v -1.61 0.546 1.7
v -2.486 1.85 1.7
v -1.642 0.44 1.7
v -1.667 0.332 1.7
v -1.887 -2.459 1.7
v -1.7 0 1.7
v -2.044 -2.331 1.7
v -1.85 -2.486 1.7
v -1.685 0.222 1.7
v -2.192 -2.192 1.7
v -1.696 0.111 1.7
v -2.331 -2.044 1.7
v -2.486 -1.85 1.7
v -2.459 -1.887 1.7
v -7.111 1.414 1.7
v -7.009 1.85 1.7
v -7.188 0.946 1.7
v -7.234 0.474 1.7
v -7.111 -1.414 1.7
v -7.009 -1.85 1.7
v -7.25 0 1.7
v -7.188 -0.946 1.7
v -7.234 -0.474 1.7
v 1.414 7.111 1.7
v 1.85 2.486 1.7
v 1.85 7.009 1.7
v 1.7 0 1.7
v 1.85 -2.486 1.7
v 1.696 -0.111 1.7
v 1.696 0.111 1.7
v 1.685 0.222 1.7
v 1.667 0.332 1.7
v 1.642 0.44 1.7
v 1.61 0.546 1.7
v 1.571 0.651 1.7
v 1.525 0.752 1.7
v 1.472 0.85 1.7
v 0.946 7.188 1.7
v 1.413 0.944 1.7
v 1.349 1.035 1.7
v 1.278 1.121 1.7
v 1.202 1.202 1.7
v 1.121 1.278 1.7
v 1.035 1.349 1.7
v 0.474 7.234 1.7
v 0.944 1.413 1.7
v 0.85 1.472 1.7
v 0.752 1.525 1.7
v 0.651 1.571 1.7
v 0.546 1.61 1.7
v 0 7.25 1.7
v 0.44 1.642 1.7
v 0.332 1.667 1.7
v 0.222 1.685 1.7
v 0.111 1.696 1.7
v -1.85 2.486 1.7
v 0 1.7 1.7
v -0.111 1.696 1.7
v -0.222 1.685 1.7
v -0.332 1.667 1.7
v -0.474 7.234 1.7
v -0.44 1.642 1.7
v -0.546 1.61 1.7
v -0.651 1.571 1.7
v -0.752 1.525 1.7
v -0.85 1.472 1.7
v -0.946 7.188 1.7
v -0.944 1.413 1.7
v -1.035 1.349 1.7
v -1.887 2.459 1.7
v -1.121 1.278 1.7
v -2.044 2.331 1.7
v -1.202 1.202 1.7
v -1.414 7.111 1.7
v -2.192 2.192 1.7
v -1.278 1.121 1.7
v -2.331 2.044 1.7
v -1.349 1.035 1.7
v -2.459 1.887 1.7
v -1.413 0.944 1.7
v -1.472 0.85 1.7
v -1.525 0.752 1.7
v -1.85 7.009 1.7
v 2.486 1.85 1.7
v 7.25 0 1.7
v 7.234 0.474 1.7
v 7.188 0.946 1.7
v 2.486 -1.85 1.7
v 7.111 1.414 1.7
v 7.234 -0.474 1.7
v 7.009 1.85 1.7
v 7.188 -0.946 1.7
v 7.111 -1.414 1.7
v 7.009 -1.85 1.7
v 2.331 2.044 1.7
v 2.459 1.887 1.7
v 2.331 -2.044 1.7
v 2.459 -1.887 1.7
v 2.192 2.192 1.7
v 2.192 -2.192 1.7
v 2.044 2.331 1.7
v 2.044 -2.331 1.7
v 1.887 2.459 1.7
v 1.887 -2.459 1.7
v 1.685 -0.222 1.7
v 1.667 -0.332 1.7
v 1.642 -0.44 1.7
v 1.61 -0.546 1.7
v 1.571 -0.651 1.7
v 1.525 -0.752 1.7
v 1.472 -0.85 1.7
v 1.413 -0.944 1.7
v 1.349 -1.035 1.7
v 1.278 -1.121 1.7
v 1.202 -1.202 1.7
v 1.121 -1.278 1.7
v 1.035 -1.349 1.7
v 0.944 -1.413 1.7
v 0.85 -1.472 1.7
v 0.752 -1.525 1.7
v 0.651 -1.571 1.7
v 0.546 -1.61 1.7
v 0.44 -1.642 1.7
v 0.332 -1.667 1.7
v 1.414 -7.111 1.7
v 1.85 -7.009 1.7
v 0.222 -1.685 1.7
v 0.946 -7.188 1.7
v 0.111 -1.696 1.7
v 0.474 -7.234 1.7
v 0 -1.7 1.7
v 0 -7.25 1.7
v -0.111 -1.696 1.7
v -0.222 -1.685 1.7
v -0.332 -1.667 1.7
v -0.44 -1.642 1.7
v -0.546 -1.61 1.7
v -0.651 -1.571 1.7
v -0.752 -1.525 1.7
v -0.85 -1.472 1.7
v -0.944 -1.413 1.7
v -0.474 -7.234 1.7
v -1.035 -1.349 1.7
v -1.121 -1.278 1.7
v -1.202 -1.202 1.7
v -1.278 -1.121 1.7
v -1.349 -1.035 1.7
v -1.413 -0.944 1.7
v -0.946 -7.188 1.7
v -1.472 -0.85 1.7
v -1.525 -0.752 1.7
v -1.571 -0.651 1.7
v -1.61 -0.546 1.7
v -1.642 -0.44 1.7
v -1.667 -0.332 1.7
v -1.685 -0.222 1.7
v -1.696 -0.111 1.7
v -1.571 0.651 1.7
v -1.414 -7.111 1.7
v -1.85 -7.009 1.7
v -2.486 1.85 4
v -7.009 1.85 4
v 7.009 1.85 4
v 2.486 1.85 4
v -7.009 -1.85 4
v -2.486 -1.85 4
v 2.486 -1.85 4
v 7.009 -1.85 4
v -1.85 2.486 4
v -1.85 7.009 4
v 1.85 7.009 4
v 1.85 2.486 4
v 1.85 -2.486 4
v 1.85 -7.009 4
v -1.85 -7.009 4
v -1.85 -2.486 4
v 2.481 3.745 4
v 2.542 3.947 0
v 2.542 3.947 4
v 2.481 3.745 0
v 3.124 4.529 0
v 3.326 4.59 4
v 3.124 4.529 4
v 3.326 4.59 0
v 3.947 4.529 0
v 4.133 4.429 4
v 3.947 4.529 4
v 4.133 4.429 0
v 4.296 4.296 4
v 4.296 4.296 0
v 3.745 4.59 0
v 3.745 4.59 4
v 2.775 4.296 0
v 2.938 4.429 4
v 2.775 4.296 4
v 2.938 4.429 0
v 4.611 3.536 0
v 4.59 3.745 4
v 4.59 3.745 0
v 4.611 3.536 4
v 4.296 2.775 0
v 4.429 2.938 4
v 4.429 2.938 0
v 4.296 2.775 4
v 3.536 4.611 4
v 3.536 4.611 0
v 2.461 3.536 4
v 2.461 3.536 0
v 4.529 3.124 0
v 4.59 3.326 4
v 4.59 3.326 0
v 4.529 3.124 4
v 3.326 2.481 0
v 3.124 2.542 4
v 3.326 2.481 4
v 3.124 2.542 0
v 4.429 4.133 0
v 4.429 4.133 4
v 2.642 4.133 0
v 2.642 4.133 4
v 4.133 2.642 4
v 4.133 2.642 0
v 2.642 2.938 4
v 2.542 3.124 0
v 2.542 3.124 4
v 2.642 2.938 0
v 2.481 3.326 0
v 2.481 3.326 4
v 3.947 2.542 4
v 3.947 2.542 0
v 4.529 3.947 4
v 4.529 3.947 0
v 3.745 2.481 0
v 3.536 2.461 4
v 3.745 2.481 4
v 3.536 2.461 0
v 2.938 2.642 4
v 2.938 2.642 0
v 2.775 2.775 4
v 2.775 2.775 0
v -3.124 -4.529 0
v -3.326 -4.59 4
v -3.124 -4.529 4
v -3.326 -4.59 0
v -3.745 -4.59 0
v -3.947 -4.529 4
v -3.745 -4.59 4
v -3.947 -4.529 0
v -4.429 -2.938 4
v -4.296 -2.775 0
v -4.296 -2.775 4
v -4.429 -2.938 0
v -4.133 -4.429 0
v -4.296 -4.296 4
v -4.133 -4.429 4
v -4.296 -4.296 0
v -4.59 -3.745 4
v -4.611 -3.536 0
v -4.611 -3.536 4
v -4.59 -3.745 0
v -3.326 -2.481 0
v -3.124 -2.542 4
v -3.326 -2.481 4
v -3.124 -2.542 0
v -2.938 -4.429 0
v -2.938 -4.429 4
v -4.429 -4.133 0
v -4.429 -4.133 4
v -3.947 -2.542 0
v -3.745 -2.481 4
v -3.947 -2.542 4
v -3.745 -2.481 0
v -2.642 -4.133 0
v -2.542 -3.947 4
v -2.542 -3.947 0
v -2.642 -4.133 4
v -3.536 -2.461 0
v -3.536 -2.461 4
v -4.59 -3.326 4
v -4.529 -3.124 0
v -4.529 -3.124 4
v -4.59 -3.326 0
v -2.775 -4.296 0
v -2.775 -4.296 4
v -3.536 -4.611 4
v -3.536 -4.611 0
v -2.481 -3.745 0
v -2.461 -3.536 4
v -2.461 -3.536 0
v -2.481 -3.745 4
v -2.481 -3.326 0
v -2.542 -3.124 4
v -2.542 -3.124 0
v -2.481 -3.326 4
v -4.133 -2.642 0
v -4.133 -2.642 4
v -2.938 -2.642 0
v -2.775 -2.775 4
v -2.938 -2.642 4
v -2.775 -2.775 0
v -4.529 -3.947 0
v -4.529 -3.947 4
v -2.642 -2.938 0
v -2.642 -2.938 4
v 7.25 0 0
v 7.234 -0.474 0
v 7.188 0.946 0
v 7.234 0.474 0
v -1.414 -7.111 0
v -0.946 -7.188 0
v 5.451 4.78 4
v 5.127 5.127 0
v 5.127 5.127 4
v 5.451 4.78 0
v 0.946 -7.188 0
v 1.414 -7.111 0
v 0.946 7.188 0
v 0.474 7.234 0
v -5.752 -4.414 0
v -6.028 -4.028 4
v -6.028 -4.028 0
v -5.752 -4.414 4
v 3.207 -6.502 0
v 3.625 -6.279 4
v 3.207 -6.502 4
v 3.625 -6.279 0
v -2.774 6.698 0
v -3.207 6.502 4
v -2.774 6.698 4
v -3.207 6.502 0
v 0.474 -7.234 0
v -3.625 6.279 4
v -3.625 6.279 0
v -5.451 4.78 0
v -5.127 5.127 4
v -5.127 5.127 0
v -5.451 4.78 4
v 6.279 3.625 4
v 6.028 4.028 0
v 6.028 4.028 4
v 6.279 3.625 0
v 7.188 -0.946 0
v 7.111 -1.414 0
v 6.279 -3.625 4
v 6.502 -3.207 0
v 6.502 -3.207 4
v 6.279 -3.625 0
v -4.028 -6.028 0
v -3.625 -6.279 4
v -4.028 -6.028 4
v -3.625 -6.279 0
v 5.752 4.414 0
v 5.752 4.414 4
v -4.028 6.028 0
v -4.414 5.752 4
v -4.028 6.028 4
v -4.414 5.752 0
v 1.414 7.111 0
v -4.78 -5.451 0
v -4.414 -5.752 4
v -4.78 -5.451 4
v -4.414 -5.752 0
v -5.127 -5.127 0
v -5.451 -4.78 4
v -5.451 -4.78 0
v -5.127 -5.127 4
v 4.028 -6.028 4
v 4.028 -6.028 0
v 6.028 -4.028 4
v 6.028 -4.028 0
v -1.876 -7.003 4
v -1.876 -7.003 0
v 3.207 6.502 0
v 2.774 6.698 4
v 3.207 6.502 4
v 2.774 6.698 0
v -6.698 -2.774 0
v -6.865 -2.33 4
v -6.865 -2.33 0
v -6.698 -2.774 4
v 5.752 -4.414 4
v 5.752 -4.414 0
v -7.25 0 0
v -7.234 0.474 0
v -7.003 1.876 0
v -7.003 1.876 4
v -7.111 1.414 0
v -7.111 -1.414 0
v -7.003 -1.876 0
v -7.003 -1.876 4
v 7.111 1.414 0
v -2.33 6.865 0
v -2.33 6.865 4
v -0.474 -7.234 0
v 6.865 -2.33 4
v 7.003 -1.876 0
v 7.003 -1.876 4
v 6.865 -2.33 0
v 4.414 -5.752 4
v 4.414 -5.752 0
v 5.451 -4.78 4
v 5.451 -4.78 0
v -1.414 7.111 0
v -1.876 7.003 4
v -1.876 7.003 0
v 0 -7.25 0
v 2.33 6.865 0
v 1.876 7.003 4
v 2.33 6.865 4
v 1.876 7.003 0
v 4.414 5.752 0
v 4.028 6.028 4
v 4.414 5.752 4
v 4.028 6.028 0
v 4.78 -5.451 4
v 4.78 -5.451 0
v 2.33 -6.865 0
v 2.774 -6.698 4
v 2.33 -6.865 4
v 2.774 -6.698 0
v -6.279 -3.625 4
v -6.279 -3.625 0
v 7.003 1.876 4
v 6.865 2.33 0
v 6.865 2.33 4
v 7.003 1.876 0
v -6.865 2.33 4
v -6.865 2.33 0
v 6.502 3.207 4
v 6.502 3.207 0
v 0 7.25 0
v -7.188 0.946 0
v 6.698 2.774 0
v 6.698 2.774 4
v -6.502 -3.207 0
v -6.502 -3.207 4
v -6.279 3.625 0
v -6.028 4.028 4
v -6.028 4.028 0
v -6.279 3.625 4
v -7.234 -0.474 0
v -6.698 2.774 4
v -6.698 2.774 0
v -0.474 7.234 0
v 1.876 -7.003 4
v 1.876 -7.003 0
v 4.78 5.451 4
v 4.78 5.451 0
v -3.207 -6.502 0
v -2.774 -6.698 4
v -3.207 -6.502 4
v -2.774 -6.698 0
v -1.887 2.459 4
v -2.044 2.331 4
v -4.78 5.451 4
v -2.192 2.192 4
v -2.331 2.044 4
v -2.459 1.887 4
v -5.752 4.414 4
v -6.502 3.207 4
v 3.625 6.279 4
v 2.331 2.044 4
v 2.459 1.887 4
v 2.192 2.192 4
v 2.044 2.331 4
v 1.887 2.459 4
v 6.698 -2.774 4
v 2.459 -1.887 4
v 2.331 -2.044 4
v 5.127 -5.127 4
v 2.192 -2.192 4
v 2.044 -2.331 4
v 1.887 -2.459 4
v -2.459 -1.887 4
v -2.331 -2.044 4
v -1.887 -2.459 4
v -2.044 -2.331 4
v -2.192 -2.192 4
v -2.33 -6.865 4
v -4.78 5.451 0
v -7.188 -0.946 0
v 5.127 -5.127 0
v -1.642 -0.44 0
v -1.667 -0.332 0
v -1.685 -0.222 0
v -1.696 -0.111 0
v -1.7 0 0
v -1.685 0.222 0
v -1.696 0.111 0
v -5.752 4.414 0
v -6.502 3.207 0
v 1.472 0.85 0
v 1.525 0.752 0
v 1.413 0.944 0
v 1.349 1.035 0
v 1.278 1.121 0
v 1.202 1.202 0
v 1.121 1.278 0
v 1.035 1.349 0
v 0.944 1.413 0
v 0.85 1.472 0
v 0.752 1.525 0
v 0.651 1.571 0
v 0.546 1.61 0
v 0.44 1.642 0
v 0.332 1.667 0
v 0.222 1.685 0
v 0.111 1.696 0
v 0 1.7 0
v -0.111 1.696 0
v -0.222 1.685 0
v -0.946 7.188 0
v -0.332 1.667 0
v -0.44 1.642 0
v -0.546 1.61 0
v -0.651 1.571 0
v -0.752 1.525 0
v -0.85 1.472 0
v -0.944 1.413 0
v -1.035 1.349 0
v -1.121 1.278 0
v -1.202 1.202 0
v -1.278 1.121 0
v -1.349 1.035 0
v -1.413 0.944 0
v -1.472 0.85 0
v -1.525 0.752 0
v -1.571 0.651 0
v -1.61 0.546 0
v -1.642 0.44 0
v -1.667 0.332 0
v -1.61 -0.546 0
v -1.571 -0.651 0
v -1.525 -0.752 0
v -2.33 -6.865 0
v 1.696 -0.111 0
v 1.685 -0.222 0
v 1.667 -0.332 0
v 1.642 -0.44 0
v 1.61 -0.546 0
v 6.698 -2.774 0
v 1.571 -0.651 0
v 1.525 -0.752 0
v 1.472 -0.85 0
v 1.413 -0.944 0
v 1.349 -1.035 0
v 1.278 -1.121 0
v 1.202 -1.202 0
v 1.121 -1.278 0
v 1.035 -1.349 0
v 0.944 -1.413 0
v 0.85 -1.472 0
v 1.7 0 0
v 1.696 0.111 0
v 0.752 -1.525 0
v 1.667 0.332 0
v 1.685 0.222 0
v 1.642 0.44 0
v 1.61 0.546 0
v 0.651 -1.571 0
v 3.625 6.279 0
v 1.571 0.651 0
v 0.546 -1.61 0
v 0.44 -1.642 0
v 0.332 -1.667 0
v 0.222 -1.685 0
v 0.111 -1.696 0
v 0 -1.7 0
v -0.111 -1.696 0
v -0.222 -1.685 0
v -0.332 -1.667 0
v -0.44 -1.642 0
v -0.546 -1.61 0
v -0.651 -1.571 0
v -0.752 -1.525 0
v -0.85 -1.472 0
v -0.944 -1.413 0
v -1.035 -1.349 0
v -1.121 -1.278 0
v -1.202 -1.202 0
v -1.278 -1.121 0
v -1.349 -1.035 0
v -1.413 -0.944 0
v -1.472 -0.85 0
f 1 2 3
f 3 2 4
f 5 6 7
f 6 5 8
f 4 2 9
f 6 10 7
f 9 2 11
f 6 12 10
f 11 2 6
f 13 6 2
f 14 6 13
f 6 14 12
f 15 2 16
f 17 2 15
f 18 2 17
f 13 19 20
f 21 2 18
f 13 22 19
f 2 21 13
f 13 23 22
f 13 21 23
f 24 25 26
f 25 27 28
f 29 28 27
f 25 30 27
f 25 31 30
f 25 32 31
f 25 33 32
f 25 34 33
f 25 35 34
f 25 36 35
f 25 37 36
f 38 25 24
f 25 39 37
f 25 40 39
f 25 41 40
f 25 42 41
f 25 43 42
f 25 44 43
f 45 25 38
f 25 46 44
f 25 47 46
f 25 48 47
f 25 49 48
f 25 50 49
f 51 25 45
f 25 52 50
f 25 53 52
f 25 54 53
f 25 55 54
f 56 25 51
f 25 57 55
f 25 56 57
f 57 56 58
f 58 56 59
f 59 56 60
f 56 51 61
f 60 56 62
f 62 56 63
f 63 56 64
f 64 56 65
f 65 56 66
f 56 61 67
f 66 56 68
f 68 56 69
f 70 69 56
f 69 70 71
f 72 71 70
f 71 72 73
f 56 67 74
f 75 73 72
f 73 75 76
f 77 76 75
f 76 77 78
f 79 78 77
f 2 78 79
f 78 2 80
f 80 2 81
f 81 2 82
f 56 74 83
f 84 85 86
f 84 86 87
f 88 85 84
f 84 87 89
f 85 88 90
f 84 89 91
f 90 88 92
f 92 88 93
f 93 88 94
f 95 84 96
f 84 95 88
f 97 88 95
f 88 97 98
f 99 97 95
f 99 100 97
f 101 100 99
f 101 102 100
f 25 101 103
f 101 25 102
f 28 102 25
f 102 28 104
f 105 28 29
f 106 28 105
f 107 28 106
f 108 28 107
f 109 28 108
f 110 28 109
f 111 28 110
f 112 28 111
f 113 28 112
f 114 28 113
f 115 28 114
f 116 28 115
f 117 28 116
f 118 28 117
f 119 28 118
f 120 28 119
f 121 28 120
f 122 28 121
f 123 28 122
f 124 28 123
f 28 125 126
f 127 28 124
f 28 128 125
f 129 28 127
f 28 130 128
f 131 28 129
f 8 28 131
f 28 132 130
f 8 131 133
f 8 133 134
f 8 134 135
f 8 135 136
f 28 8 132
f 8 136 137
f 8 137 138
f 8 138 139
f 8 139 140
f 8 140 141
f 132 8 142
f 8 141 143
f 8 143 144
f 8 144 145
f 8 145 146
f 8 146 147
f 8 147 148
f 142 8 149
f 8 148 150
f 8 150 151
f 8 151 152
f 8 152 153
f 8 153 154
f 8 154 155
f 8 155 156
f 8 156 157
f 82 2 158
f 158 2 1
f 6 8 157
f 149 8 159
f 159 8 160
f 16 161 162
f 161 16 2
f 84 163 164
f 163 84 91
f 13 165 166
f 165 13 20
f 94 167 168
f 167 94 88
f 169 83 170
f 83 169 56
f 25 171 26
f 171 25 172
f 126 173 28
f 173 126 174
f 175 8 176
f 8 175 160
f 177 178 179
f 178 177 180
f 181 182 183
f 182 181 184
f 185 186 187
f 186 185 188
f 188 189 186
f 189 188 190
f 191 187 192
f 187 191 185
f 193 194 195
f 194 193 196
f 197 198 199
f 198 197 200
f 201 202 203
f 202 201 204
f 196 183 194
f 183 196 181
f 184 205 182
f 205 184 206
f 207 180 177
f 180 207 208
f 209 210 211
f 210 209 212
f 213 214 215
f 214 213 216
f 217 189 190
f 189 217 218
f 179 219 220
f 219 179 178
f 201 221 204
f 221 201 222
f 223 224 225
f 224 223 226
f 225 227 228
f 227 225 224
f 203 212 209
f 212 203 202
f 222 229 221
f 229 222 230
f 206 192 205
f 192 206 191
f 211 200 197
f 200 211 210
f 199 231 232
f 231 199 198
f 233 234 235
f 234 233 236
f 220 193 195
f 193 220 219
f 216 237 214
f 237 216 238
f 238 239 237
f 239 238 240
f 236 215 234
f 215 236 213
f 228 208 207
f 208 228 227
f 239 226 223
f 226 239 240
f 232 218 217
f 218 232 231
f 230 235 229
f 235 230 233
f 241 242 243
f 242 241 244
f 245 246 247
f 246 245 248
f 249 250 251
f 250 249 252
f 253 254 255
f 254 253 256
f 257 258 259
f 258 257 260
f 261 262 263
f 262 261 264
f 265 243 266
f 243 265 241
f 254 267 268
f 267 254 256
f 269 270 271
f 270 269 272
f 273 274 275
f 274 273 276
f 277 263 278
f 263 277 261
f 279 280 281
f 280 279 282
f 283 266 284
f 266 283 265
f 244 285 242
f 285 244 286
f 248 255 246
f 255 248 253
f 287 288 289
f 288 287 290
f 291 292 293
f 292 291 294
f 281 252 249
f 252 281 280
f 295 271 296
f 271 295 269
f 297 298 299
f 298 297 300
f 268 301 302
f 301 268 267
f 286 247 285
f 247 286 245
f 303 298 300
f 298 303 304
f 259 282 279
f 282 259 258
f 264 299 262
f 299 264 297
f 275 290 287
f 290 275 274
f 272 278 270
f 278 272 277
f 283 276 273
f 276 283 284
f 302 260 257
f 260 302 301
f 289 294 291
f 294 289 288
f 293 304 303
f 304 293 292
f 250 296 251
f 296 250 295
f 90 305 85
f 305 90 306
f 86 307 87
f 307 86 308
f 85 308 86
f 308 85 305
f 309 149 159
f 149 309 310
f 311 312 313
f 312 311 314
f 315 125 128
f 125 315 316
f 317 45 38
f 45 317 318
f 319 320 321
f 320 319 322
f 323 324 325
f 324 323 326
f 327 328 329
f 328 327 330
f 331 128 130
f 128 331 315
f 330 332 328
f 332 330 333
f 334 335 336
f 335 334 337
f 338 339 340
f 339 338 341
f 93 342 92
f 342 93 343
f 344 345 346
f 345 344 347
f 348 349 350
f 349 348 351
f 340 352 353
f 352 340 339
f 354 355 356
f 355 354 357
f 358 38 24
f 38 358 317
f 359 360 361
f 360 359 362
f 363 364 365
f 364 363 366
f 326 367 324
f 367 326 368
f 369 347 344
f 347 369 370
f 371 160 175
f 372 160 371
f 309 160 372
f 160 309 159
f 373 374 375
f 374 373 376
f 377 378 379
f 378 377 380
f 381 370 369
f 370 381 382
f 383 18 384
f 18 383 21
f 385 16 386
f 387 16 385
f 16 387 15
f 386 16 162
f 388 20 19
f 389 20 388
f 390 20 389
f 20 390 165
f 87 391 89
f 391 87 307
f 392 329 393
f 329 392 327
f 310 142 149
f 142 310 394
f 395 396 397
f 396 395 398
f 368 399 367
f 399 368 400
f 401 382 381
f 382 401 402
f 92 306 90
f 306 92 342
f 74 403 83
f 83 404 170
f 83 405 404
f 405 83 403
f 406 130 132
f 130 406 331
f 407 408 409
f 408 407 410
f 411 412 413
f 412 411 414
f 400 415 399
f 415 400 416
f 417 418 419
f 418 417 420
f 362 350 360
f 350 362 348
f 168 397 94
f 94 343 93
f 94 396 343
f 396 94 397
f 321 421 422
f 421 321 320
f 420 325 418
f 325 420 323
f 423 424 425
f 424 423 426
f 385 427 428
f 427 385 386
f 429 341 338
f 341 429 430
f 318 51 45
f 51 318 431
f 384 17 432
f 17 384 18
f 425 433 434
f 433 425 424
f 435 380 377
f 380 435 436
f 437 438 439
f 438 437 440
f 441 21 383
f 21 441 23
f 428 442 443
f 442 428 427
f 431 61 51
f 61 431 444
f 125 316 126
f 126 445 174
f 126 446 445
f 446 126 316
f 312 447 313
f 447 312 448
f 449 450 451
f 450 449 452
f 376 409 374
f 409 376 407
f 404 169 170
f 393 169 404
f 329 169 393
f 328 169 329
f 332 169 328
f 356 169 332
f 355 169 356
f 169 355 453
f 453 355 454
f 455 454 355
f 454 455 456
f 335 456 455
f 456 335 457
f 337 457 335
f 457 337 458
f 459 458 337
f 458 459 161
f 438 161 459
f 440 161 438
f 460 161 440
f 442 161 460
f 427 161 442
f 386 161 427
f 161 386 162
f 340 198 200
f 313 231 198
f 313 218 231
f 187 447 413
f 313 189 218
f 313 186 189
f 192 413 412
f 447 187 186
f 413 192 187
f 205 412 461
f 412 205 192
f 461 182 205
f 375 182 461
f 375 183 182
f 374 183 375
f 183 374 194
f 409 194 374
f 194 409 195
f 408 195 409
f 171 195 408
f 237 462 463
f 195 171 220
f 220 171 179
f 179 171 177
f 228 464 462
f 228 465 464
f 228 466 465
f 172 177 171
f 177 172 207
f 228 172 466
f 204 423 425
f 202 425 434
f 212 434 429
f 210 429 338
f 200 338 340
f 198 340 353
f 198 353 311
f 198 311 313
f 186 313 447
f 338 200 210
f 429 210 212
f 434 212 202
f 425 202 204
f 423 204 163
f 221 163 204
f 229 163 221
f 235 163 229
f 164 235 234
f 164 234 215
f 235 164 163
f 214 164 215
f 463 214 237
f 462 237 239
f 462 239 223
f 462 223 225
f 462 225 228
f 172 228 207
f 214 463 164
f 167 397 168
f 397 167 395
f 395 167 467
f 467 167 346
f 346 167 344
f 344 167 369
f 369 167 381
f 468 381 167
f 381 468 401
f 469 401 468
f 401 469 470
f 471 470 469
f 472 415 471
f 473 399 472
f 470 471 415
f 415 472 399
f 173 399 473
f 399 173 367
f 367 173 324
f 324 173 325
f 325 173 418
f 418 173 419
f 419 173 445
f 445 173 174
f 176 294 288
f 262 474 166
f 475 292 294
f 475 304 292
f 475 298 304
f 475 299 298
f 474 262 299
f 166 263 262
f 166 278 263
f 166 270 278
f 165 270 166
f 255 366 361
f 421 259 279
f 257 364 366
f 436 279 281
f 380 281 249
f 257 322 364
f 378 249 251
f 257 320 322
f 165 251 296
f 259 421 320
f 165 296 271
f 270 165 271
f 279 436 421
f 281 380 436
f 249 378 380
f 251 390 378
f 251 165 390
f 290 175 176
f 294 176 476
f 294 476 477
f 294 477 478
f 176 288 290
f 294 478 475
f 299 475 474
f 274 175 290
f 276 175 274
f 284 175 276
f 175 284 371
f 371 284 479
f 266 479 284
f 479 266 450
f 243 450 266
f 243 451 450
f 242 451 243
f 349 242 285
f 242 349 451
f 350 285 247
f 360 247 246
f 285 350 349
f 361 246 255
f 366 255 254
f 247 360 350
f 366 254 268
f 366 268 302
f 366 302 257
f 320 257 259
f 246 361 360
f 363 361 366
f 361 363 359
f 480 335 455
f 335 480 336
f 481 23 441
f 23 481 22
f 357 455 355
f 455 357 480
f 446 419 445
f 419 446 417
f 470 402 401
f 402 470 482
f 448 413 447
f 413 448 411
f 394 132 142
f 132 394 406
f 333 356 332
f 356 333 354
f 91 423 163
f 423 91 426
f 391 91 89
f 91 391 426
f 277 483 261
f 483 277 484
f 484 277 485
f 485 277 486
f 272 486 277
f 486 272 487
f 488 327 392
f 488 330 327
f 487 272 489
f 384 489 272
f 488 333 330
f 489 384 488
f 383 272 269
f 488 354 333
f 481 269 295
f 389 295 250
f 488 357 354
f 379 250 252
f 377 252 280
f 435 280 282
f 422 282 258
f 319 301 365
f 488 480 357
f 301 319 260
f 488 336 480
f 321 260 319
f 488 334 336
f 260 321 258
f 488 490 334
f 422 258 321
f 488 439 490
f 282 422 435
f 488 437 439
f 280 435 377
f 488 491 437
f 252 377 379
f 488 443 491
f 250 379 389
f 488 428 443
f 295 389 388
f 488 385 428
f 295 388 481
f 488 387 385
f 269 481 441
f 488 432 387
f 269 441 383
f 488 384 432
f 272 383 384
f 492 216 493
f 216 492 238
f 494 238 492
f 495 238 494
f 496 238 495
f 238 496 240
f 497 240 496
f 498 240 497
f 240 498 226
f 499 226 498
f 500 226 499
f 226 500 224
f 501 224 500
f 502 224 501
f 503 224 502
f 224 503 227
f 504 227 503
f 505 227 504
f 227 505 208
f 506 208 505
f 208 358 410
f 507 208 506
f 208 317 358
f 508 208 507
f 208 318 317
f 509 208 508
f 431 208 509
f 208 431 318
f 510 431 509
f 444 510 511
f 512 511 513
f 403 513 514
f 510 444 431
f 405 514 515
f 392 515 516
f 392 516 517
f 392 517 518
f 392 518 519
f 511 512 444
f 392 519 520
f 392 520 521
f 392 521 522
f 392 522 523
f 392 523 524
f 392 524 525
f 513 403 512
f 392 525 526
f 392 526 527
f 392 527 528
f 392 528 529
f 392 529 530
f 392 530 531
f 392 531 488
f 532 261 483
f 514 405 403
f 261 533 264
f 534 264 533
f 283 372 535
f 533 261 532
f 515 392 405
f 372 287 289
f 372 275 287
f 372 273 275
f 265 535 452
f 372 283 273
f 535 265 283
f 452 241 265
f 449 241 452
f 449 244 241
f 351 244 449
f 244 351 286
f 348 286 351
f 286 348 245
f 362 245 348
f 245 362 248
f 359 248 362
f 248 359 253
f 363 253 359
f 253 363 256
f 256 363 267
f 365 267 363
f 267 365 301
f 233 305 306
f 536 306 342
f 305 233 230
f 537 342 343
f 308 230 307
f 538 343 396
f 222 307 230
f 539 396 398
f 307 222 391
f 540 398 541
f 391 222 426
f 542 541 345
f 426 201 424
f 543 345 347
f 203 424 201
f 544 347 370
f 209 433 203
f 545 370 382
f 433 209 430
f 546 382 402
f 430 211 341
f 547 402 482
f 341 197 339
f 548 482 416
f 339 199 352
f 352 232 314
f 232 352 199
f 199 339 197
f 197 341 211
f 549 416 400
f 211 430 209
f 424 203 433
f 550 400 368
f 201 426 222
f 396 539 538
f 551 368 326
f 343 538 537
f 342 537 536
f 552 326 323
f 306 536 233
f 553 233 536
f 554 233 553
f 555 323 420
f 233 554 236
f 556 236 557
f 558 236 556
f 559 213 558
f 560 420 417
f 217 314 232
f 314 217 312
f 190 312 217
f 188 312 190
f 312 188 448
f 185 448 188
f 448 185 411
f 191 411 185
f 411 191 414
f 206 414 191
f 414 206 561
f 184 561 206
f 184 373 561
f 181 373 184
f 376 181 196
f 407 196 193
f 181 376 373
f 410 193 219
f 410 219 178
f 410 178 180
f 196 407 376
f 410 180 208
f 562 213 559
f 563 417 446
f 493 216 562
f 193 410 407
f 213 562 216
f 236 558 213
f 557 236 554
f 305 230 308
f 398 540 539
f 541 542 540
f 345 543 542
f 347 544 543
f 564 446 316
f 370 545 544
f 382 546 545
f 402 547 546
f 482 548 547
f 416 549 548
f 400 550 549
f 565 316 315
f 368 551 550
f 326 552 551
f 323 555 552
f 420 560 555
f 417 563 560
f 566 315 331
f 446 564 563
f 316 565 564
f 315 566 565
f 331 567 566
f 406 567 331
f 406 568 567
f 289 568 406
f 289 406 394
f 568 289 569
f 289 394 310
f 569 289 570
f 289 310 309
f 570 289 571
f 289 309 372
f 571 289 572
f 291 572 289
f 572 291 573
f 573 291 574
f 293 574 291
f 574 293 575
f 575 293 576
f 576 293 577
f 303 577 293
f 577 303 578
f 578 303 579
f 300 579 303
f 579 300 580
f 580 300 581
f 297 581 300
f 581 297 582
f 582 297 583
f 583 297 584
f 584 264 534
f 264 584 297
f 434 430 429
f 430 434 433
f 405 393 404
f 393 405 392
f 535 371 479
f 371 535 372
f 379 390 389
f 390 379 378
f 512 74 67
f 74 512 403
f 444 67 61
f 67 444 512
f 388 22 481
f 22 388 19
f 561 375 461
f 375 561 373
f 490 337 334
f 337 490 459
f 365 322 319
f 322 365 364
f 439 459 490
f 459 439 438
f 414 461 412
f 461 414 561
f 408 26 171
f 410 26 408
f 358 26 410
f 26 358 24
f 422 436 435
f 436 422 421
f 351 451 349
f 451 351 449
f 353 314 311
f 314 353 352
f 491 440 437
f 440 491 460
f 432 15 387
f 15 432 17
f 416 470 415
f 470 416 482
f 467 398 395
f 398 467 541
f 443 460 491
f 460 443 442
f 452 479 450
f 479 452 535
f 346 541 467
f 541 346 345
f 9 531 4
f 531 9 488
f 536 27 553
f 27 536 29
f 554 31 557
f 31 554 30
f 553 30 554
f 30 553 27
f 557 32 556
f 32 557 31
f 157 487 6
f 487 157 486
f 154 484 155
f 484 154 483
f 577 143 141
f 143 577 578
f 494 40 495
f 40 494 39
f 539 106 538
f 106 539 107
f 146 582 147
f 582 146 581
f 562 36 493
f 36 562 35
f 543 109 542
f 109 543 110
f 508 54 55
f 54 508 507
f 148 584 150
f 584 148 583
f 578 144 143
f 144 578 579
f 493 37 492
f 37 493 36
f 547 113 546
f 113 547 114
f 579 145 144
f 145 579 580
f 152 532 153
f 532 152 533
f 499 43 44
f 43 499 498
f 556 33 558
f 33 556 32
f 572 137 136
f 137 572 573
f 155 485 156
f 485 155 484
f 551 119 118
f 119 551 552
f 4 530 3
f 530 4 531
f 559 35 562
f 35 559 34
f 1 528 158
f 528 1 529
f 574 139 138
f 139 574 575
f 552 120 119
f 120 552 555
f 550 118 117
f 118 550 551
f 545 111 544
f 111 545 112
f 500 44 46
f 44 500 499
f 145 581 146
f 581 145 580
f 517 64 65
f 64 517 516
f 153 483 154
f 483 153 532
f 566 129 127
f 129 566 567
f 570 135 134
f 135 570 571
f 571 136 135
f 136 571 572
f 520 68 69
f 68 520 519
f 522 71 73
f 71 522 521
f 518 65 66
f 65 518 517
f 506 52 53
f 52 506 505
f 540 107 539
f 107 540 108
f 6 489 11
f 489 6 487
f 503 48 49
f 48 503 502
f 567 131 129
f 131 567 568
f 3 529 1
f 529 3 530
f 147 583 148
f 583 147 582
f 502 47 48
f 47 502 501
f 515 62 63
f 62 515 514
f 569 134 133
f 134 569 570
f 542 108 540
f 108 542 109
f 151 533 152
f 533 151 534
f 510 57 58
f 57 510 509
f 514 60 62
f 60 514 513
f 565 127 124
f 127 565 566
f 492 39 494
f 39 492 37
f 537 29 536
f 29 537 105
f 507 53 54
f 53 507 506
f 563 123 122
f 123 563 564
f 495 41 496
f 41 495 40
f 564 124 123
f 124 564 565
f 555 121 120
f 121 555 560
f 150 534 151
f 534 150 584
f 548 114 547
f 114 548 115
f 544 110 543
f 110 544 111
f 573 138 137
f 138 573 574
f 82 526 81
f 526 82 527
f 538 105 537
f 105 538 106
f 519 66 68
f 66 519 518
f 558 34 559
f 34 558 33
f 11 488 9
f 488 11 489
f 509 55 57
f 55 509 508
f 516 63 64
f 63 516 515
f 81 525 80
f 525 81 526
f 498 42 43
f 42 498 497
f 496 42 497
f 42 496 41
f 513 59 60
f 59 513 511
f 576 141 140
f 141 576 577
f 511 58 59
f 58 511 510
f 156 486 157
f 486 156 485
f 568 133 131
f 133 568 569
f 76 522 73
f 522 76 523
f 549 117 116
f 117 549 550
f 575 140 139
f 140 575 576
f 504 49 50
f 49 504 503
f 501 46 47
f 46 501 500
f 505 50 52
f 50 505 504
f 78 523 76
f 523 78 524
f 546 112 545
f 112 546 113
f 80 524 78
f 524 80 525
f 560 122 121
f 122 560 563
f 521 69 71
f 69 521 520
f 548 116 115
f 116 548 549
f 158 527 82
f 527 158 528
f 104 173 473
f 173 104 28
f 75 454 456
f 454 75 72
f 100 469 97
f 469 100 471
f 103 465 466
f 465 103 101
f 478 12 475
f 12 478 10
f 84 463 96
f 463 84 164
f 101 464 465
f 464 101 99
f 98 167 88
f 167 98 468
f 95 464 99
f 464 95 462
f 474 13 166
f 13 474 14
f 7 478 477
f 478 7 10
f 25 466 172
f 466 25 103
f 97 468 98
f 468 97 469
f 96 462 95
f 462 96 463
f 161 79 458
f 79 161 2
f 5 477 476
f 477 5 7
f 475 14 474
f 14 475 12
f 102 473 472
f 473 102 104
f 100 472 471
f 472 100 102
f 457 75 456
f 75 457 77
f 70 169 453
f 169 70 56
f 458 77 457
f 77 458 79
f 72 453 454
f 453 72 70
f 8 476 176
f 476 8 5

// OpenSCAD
// SHORT VERSION - Replacement motor coupler for LiftMaster 8550W travel module drive
// Disc fastened to the end of the motor shaft with a single center screw.
// 4 slots on top receive the travel module's 4 lugs (3 mm wide, 3 mm tall).
// The screw head sits in a recess below the slot floor so it can't hit the lugs.
// All dimensions in mm. Edit values below, then F6 render and export STL.

// ---- Measured ----
outer_d      = 14.5;  // outside diameter (reduced 0.5 mm)
total_h      = 4;     // overall depth (short version: 2 mm less)
lug_w        = 3;     // width of the travel module's lugs
lug_h        = 3;     // height of the travel module's lugs
lug_count    = 4;

// ---- Screw (default M3 pan/socket head) ----
screw_clear_d = 3.4;  // clearance hole: M2.5=2.9, M3=3.4, M4=4.5, #4=3.2, #6=3.8
head_d        = 6.2;  // screw head diameter + ~0.4 clearance
head_recess_h = 2.3;  // recess depth from top (matches slot depth)

// ---- Fit tuning ----
slot_clear   = 0.7;   // extra slot width (was 0.4; loosened after test fit)
slot_extra_h = 0.3;   // extra slot depth so lugs don't bottom out

// ---- Anti-spin pins ----
// Two through-holes under the solid segments (between slots), 180 deg apart.
// Pins MUST land in a part that ROTATES with the motor shaft, never the
// stationary motor housing. Set pin_r so the pins sit inside the rotating hub.
// Tip: print, screw the disc on, and use the holes as a drill guide.
pin_count = 2;
pin_d     = 2.0;    // pin diameter (2 mm drill bit shank, nail, steel dowel)
pin_fit   = 0.15;   // added to hole; printed holes run small -> snug press fit
pin_r     = 5.0;    // distance from center to pin center  <-- CHECK vs. hub size

$fn = 96;

slot_w = lug_w + slot_clear;
slot_h = lug_h + slot_extra_h - 1;   // short version: slots 1 mm shallower (2.3 mm)

difference() {
    cylinder(d = outer_d, h = total_h);

    // through hole for screw
    translate([0, 0, -1]) cylinder(d = screw_clear_d, h = total_h + 2);

    // recess for screw head, from the top (slot side)
    translate([0, 0, total_h - head_recess_h])
        cylinder(d = head_d, h = head_recess_h + 1);

    // lug slots, cut radially from the top face
    for (i = [0 : lug_count - 1])
        rotate([0, 0, i * 360 / lug_count])
            translate([0, -slot_w/2, total_h - slot_h])
                cube([outer_d, slot_w, slot_h + 1]);

    // anti-spin pin holes, centered under the solid segments (45 deg off slots)
    for (i = [0 : pin_count - 1])
        rotate([0, 0, 45 + i * 360 / pin_count])
            translate([pin_r, 0, -1])
                cylinder(d = pin_d + pin_fit, h = total_h + 2, $fn = 32);
}
